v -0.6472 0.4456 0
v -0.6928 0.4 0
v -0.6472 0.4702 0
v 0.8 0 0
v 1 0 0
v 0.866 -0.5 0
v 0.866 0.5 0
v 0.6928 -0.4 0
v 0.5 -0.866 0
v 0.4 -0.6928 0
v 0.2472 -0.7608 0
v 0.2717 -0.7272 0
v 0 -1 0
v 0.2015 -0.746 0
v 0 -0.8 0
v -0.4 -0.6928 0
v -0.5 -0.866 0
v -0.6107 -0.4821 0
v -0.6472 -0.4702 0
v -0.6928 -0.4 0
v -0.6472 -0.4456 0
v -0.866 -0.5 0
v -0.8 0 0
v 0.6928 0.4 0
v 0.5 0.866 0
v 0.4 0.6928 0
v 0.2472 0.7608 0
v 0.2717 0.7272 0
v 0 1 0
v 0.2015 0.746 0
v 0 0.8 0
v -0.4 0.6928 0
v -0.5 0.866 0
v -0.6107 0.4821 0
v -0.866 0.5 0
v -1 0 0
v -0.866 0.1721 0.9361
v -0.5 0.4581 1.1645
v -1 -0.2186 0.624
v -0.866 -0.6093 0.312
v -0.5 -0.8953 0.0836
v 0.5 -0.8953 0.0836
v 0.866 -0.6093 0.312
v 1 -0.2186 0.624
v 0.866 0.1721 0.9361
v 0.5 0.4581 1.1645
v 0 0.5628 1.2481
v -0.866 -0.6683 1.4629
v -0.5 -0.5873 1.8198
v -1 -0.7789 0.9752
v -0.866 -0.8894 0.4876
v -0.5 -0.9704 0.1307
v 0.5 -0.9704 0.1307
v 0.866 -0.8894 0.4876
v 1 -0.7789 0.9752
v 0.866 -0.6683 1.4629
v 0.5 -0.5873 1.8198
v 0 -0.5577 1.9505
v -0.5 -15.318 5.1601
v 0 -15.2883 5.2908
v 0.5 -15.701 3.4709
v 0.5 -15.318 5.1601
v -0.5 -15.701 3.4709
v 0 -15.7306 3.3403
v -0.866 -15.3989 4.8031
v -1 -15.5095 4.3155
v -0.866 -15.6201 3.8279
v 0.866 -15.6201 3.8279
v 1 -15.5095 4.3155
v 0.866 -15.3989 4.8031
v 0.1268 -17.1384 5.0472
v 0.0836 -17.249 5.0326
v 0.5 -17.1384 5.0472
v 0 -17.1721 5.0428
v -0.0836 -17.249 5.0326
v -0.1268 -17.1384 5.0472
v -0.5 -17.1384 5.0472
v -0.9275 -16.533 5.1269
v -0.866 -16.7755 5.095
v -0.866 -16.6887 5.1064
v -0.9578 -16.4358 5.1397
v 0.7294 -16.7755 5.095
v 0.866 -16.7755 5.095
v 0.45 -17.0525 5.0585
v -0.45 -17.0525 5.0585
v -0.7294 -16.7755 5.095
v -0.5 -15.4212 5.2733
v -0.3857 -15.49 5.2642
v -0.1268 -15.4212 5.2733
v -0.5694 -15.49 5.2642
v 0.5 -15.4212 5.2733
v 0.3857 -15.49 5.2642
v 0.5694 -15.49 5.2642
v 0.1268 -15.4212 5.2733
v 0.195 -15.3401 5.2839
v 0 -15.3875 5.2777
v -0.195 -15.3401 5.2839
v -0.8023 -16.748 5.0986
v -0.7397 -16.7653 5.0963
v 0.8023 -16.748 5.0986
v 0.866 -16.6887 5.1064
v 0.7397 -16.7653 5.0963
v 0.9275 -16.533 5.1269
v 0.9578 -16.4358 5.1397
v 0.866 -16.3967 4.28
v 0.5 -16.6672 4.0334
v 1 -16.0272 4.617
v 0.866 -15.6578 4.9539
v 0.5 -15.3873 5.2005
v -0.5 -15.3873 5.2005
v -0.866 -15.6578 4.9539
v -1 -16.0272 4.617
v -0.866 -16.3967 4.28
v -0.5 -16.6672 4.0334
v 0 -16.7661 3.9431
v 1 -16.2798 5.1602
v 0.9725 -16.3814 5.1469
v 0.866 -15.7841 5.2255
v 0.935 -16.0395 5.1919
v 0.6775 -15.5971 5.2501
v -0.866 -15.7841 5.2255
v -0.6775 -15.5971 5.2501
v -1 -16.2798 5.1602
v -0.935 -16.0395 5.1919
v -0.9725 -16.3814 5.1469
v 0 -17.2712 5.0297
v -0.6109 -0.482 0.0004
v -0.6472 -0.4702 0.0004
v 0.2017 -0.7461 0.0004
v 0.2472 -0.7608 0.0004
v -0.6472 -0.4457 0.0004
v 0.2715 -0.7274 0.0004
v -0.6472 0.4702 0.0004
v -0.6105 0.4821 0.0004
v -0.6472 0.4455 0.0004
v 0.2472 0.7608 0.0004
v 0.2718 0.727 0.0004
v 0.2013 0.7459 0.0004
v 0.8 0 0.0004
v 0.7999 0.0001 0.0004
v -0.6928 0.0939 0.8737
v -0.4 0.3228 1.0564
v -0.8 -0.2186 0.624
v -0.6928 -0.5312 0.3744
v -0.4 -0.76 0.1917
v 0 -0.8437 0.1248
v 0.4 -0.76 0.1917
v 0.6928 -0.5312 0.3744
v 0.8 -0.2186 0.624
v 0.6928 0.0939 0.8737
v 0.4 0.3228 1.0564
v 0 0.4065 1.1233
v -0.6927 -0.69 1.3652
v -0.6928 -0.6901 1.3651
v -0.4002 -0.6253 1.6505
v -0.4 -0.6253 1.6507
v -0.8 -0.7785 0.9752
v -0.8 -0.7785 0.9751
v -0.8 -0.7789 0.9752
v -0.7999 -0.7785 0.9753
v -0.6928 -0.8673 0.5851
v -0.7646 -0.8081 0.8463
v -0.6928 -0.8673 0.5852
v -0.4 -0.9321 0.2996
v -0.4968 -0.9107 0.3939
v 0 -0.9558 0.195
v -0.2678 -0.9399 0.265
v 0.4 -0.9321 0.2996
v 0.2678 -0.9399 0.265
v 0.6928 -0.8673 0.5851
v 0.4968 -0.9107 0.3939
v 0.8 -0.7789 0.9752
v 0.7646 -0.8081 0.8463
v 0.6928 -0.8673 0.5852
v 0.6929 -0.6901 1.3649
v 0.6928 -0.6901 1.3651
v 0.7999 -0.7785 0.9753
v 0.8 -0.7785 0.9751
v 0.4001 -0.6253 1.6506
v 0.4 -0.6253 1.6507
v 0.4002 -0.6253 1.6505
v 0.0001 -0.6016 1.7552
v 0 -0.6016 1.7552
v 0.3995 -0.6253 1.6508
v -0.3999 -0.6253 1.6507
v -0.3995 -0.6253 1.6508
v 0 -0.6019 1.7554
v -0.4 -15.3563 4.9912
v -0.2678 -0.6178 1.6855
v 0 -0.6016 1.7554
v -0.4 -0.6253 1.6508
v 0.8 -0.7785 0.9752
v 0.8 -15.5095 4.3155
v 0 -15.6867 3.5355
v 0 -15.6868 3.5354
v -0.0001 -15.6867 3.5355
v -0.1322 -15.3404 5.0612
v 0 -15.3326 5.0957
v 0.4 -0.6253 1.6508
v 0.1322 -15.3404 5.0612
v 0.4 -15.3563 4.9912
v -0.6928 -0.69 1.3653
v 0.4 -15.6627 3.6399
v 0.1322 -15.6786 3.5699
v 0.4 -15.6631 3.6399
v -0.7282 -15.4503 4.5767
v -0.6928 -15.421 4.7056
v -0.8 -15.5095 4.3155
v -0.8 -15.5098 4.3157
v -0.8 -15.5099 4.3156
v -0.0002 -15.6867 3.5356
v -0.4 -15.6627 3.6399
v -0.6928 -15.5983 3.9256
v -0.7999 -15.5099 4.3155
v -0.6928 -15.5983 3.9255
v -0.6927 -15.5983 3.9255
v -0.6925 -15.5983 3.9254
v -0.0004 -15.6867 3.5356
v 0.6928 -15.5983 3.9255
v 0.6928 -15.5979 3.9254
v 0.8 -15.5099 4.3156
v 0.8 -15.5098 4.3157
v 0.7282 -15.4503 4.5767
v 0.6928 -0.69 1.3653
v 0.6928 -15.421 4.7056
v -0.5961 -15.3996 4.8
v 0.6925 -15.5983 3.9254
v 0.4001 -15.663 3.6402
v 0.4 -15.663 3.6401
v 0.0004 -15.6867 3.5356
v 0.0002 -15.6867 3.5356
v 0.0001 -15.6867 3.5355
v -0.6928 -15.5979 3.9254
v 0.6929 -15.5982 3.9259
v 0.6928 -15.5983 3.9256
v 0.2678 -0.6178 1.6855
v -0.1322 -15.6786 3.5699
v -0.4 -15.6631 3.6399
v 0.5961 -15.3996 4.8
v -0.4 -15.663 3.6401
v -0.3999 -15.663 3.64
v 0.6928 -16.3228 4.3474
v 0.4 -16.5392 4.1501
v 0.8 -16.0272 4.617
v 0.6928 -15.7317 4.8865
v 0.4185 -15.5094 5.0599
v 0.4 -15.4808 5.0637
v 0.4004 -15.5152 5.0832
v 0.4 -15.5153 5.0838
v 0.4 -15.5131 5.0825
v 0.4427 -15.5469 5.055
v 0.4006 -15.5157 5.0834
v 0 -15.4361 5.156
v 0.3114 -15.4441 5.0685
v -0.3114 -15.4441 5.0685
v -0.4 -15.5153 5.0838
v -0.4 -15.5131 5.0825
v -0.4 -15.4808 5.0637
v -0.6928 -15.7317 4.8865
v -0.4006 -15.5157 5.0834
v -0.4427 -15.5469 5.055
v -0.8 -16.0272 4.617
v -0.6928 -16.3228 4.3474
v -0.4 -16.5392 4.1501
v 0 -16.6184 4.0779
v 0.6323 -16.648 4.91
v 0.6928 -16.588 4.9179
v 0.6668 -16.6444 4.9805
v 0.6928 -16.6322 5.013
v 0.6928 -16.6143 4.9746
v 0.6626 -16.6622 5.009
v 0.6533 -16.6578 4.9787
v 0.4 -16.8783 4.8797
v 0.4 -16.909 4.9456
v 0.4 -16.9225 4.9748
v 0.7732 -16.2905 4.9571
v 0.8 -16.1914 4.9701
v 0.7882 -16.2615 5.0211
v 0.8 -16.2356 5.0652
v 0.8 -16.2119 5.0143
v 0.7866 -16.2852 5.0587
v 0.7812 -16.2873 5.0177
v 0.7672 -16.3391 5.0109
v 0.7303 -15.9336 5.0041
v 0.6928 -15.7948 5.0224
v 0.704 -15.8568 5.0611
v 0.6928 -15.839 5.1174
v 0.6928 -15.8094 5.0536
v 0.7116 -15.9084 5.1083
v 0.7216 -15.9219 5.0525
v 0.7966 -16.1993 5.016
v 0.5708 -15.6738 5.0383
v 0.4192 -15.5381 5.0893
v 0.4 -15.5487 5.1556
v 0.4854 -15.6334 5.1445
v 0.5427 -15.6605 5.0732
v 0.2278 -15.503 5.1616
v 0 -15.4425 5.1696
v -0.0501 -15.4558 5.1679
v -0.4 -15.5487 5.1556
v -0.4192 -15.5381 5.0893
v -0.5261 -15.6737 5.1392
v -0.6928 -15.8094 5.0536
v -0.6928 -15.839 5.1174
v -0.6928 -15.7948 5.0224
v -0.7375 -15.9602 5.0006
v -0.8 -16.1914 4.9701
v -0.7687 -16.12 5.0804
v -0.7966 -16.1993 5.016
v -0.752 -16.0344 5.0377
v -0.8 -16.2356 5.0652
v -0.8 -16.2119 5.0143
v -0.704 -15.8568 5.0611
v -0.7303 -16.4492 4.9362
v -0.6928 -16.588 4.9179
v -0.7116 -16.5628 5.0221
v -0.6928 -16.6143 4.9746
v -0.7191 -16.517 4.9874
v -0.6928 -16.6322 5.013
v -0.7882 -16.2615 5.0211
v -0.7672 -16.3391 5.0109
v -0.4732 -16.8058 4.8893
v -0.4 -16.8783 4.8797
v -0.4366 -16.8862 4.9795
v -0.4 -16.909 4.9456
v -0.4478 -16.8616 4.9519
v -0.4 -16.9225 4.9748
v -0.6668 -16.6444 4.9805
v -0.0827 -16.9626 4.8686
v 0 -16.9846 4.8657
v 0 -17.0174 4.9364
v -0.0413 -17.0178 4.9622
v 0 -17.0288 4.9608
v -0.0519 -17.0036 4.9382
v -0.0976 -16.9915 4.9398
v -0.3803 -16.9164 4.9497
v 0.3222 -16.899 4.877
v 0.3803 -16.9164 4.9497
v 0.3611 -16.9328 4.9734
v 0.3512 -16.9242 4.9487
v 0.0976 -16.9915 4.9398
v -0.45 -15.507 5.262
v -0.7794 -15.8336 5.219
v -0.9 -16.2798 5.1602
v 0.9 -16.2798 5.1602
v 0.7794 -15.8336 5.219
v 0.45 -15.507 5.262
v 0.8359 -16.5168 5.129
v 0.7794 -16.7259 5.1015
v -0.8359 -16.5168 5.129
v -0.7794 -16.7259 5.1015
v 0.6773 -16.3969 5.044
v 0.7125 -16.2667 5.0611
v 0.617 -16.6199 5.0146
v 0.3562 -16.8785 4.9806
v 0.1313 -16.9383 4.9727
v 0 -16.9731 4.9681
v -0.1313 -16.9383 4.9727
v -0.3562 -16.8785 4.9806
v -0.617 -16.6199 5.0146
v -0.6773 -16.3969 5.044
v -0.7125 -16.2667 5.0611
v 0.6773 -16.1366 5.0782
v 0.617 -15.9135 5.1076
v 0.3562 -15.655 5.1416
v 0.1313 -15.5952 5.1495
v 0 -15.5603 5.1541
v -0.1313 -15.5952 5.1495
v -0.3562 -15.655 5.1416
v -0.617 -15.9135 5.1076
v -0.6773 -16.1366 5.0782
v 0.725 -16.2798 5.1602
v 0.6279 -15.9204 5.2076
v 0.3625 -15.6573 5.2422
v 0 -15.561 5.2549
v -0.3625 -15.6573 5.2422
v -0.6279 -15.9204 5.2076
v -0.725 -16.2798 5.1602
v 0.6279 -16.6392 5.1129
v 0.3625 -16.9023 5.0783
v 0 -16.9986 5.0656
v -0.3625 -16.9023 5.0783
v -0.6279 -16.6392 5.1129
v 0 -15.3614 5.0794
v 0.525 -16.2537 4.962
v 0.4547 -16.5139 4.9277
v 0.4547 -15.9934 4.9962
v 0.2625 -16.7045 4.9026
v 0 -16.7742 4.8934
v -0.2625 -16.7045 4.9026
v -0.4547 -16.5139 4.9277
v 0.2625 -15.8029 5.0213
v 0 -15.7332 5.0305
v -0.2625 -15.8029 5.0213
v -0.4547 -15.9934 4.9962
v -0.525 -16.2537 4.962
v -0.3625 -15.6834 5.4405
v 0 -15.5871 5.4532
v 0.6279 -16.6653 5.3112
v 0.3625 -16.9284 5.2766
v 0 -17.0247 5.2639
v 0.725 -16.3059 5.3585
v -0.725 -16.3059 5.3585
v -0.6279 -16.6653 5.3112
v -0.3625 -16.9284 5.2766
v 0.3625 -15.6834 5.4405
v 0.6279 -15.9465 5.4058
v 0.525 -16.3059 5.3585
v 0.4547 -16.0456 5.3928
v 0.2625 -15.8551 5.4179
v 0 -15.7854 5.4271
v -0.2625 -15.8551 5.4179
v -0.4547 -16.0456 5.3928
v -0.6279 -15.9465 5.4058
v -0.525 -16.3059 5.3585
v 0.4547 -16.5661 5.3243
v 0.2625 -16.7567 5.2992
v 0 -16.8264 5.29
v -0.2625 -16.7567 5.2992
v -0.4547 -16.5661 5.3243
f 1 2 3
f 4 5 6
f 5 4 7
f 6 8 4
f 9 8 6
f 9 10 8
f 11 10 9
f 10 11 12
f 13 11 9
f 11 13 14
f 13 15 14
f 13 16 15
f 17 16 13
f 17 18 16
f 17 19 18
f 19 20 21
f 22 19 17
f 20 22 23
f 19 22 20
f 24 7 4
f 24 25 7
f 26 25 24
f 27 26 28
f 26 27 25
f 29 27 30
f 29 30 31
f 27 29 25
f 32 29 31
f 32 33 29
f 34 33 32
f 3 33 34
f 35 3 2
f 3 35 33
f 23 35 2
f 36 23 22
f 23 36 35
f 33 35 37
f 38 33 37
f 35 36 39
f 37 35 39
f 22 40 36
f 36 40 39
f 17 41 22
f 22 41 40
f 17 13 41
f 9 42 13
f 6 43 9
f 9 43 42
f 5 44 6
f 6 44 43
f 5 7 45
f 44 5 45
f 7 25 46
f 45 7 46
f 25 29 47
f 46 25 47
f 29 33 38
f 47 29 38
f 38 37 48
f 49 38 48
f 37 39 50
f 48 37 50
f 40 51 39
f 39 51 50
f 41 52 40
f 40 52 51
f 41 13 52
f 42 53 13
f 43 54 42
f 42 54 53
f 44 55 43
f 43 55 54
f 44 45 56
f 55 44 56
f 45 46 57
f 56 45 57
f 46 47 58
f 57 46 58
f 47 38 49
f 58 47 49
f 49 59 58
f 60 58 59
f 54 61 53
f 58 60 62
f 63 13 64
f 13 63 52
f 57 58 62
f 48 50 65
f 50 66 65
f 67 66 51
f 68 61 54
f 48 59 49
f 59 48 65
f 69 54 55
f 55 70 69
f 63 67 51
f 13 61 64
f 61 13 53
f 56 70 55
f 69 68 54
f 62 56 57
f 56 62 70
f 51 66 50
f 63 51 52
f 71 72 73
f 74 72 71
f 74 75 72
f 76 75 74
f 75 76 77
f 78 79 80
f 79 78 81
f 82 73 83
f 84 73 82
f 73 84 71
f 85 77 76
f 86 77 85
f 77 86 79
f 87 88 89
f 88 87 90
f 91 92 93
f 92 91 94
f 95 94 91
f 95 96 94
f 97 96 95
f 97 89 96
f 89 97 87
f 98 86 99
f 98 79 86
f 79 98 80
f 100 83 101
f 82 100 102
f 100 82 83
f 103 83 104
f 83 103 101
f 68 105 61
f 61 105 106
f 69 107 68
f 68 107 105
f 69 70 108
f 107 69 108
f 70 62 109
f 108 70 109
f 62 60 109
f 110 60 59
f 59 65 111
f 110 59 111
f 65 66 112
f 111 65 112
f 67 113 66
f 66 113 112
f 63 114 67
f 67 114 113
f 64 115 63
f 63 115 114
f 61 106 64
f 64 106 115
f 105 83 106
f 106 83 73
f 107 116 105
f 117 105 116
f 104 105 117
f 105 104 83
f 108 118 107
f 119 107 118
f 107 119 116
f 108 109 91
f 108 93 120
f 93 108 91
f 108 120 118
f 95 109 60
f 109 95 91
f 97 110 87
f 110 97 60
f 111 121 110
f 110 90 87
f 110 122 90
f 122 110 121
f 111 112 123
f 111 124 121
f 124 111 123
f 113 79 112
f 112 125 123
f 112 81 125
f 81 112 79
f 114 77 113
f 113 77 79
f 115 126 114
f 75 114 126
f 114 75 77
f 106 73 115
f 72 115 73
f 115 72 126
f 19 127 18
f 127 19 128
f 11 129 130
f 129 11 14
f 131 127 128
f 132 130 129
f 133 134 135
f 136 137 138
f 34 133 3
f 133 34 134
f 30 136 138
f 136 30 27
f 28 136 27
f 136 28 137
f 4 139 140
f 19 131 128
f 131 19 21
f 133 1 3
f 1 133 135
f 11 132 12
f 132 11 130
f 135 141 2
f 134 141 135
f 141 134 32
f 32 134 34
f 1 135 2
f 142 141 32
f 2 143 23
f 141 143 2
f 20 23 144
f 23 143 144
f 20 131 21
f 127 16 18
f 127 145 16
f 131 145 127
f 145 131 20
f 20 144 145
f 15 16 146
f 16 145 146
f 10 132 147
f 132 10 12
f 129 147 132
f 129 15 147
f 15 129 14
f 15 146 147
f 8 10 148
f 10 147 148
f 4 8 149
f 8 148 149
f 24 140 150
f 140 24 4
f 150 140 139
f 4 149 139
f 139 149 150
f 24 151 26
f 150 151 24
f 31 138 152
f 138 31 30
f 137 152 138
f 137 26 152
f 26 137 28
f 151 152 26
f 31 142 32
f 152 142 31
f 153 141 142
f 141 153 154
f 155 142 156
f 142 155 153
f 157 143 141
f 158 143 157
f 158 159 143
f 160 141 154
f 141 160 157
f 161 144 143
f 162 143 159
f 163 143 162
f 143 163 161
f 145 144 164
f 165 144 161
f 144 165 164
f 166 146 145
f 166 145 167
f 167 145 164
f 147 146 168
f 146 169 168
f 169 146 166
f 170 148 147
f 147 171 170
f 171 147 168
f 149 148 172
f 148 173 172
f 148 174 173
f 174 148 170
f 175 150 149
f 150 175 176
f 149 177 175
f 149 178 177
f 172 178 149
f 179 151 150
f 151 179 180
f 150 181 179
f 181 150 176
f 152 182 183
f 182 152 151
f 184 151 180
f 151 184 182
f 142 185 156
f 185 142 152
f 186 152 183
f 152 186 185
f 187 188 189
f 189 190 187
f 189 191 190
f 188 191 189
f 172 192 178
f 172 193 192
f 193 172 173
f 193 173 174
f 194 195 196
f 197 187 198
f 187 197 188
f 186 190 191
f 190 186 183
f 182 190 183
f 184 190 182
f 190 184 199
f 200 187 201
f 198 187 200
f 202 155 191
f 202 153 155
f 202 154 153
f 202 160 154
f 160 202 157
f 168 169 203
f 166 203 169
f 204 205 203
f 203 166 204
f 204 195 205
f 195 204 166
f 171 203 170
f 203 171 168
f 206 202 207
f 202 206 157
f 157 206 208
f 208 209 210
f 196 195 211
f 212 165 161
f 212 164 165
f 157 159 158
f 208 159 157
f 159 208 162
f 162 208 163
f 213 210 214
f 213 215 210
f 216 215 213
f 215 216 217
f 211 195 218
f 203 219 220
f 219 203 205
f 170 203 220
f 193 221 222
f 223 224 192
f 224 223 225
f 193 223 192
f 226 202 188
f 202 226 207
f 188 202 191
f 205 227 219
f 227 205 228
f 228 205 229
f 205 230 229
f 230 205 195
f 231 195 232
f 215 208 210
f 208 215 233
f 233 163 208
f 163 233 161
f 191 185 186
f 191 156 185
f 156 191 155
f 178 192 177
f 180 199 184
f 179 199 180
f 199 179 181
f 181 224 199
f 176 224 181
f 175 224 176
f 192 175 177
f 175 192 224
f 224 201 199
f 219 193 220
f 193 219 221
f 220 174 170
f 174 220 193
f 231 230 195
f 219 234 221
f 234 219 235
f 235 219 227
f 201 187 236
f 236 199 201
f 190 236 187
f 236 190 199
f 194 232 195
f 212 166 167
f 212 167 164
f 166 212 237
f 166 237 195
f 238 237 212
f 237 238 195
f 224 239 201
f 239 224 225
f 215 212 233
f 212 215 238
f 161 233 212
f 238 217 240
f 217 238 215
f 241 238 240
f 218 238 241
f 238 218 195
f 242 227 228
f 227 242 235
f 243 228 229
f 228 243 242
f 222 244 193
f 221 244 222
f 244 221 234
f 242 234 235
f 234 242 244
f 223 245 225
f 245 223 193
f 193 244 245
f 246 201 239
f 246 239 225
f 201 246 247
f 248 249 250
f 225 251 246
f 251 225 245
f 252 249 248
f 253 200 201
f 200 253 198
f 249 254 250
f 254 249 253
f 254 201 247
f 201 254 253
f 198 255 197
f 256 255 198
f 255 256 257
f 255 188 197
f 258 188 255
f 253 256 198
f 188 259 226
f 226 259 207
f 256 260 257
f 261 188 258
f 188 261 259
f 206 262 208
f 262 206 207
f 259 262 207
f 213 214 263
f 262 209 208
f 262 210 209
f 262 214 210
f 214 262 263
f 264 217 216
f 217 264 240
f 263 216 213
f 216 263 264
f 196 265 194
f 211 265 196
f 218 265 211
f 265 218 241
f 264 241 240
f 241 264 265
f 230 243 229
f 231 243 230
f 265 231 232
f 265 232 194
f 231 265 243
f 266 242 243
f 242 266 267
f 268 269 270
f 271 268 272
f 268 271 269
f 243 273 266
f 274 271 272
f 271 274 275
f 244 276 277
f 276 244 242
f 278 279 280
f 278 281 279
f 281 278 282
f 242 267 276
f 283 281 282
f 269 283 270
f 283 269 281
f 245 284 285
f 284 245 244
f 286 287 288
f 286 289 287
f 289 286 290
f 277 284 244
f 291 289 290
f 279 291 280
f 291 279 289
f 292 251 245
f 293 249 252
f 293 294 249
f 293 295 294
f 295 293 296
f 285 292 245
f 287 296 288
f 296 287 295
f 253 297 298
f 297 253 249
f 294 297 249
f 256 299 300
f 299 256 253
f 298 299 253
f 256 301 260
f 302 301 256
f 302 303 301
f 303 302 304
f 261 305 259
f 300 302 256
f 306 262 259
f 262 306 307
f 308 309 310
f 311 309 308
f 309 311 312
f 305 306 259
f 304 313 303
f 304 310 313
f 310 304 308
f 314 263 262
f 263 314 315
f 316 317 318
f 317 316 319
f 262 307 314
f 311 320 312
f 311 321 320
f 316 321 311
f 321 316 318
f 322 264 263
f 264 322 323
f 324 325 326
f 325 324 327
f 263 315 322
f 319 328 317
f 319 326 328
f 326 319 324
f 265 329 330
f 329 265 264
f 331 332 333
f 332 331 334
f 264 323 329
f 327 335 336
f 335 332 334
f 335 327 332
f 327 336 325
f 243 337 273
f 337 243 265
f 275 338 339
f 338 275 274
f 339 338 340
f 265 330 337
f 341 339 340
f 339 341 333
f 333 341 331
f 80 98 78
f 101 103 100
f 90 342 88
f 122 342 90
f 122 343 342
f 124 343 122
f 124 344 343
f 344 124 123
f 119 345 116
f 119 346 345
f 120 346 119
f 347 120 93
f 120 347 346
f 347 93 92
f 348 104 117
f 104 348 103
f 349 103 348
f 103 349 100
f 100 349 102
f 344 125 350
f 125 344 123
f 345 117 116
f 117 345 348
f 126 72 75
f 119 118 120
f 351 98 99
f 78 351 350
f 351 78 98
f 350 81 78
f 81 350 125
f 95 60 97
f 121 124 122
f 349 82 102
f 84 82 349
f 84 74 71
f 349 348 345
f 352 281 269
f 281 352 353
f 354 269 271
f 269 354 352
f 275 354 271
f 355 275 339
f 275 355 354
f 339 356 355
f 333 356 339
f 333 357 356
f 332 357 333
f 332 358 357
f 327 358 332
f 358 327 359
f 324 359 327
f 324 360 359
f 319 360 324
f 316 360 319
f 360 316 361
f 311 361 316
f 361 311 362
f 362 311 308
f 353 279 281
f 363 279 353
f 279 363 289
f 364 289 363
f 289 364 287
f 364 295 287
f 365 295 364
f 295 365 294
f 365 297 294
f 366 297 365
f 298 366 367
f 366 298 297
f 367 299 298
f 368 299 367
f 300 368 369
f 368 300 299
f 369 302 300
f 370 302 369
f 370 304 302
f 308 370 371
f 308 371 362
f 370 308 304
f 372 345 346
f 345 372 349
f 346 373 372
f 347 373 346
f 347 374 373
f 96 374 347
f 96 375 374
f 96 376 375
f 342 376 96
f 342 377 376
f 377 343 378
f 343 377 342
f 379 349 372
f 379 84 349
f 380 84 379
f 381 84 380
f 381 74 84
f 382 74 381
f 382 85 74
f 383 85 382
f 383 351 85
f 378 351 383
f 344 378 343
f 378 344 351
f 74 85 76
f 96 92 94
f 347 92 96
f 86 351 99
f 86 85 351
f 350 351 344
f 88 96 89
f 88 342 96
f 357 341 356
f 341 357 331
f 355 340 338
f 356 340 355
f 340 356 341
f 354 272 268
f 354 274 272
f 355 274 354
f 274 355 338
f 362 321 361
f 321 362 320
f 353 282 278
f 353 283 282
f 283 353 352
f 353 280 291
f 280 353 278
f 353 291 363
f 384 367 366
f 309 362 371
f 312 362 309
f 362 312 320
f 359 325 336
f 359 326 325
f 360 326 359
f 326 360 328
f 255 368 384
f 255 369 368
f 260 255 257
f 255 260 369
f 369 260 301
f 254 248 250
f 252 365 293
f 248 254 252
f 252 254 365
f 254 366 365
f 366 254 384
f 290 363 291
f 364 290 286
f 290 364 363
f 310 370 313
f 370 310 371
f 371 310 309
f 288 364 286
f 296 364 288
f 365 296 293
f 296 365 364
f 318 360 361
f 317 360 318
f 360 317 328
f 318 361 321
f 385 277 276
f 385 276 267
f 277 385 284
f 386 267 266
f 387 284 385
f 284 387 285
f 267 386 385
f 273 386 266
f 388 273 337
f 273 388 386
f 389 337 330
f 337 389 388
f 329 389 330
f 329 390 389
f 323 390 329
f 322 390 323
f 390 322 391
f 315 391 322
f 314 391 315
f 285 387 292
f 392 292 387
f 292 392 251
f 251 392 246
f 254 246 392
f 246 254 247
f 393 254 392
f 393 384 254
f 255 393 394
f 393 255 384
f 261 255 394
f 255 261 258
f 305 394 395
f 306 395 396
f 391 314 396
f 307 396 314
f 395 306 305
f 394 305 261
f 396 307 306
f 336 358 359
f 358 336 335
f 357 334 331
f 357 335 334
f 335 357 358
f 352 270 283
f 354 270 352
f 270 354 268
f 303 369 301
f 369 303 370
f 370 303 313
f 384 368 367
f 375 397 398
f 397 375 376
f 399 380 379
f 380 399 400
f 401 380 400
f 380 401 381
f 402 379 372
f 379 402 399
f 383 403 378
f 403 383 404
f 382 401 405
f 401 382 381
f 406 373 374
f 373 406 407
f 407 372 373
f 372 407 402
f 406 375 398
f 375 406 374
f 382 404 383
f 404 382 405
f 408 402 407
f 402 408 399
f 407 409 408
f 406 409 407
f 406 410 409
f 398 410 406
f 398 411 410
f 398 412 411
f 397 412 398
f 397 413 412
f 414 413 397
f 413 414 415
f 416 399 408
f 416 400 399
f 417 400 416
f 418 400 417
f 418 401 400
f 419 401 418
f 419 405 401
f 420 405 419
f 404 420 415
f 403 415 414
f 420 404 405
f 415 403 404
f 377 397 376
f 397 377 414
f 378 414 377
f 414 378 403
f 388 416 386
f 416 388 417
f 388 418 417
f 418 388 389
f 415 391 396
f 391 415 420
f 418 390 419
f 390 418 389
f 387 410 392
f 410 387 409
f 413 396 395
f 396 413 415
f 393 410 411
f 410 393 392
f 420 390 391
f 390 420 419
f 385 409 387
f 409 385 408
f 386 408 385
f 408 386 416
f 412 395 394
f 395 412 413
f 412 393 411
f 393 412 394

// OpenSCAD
tolerance=0.075;
hole_radius=0.05;
grid_hole_radius=0.05;
outer_radius=1;
thickness=0.2;
hole_attach_height=0.05;
attach_thickness=0.1;

//parameters that don't have to be defined explicitly
eps = tolerance/100;
inner_radius = outer_radius - thickness;
fn = 12;
fnh = 6;

module angled_cylinder(angle_deg_y, _h, _r, angle_deg_x = 0) {
    rotate([angle_deg_x, angle_deg_y, 0]) { // Rotate the cylinder 
            cylinder(h = _h, r = _r, center = true, $fn = fnh);
        }
}

module hole(_h) {
    cylinder(h = _h, r = grid_hole_radius, $fn = fnh);
}

//makes circle of holes
module circular_grid(_h, _r, _n) {
    for (i = [0:_n-1]) {
        angle = i * 360 / _n;
        x_pos = _r * cos(angle);
        y_pos = _r * sin(angle);
        translate([x_pos, y_pos, -eps]) {
            hole(_h);
        }
    }
}

//makes grid of holes
module hole_grid(hole_height, grid_h) {
    translate([0,0,hole_height]) {
        difference() {
            //cylinder
            cylinder(h = grid_h, r = (inner_radius + outer_radius)/2, 
                center=false, $fn = fn);
            //holes
            for (i = [0 : grid_hole_radius * 2 + hole_attach_height : inner_radius - grid_hole_radius * 2]) {
                circular_grid(grid_h + eps*2, i, ceil(6.28*i/(grid_hole_radius*4)));
            }
            
        } 
    }
}

//makes curve of CSC
module curve(_radius, _twist, _turning_angle, _turning_radius) {
    rotate([90,0,_twist])
    translate([-_turning_radius, 0, 0])
    rotate_extrude(angle=_turning_angle, convexity=100, $fn = fn)
    translate([_turning_radius, 0]) circle(_radius);
}

module CSC(_r, _t1, _ta1, _tr1, _h, _t2, _ta2, _tr2, is_inner) {
    
    if (_ta1 > 90) {
        CSC(_r, _t1, 90, _tr1, 0, 0, 0, 0, is_inner);
        
        pos1 = (-_tr1 + sqrt(_tr1*_tr1 - pow(_tr1,2)));
        translate([pos1*cos(_t1),pos1*sin(_t1),_tr1])
        rotate([0,-90,_t1])
        CSC(_r, 0, _ta1 - 90, _tr1, _h, _t2, _ta2, _tr2, is_inner);
    } else if (_ta2 > 90) {
        CSC(_r, _t1, _ta1, _tr1, _h, _t2, 90, _tr2, is_inner);
        
        pos1 = (-_tr1 + sqrt(_tr1*_tr1 - pow(_tr1*sin(_ta1),2)));
        pos2 = (-_tr2 + sqrt(_tr2*_tr2 - pow(_tr2,2)));
        translate([pos1*cos(_t1),pos1*sin(_t1),_tr1*sin(_ta1)])
        rotate([0,-_ta1,_t1])
        translate([0, 0, _h])
        translate([pos2*cos(_t2),pos2*sin(_t2),_tr2])
        rotate([0,-90,_t2])
        CSC(_r, 0, 0, 0, 0, 0, _ta2 - 90, _tr2, is_inner);
    } else {
        //intermediate positions
        pos1 = (-_tr1 + sqrt(_tr1*_tr1 - pow(_tr1*sin(_ta1),2)));
        pos2 = (-_tr2 + sqrt(_tr2*_tr2 - pow(_tr2*sin(_ta2),2)));
        
        union() {
            //bottom shell threshold
            if (is_inner) {
                cylinder(h=eps, r=_r, center=true);
            }
            
            //first curve of CSC
            curve(_r, _t1, _ta1, _tr1);
            
            //straight link of CSC
            translate([pos1*cos(_t1),pos1*sin(_t1),_tr1*sin(_ta1)])
            rotate([0,-_ta1,_t1])
            if (is_inner) {
                //add threshold for shelling
                translate([0,0,-eps /2])
                cylinder(h=_h + eps,r=_r, center = false, $fn= fn);
            } else {
                cylinder(h=_h,r=_r, center = false, $fn= fn);
            }
            
            //second curve of CSC
            translate([pos1*cos(_t1),pos1*sin(_t1),_tr1*sin(_ta1)])
            rotate([0,-_ta1,_t1])
            translate([0, 0, _h])
            curve(_r, _t2, _ta2, _tr2);
            
            //shelling thresholds
            if (is_inner) {
                translate([pos1*cos(_t1),pos1*sin(_t1),_tr1*sin(_ta1)])
                rotate([0,-_ta1,_t1])
                translate([0, 0, _h])
                translate([pos2*cos(_t2),pos2*sin(_t2),_tr2*sin(_ta2)])
                rotate([0,-_ta2,_t2]) {
                    cylinder(h=eps, r=_r, center=true,$fn=fn);
                }
            
            }
        }
    }
    
}

//allow modules to attach
module CSC_ATTACH(_r, _t1, _ta1, _tr1, _h, _t2, _ta2, _tr2, next_hole_radius, next_hole_attach_height, next_inner) {
    
    if (_ta1 > 90) {        
        pos1 = (-_tr1 + sqrt(_tr1*_tr1 - pow(_tr1,2)));
        translate([pos1*cos(_t1),pos1*sin(_t1),_tr1])
        rotate([0,-90,_t1])
        CSC_ATTACH(_r, 0, _ta1 - 90, _tr1, _h, _t2, _ta2, _tr2, next_hole_radius, next_hole_attach_height, next_inner);
    } else if (_ta2 > 90) {        
        pos1 = (-_tr1 + sqrt(_tr1*_tr1 - pow(_tr1*sin(_ta1),2)));
        pos2 = (-_tr2 + sqrt(_tr2*_tr2 - pow(_tr2,2)));
        translate([pos1*cos(_t1),pos1*sin(_t1),_tr1*sin(_ta1)])
        rotate([0,-_ta1,_t1])
        translate([0, 0, _h])
        translate([pos2*cos(_t2),pos2*sin(_t2),_tr2])
        rotate([0,-90,_t2])
        CSC_ATTACH(_r, 0, 0, 0, 0, 0, _ta2 - 90, _tr2, next_hole_radius, next_hole_attach_height, next_inner);
    } else {
        //intermediate positions
        pos1 = (-_tr1 + sqrt(_tr1*_tr1 - pow(_tr1*sin(_ta1),2)));
        pos2 = (-_tr2 + sqrt(_tr2*_tr2 - pow(_tr2*sin(_ta2),2)));
        
        translate([pos1*cos(_t1),pos1*sin(_t1),_tr1*sin(_ta1)])
        rotate([0,-_ta1,_t1])
        translate([0, 0, _h])
        translate([pos2*cos(_t2),pos2*sin(_t2),_tr2*sin(_ta2)])
        rotate([0,-_ta2,_t2]) {
            difference() {
                union() {
                    //attachment for smaller cylinder
                    translate([0,0,-attach_thickness])
                    cylinder(h=attach_thickness, r=_r - thickness/2, $fn=fn);
                    translate([0,0,-attach_thickness*2])
                    cylinder(h=attach_thickness*2, r1=_r - thickness/2, r2=next_inner - tolerance - thickness, $fn=fn);
                    
                    //small cylinder
                    cylinder(h=next_hole_radius*2 + next_hole_attach_height * 2, r = next_inner - tolerance, $fn=fn);
                }
                
                //shelling
                translate([0,0, -attach_thickness*2 - eps/2])
                cylinder(h=next_hole_radius*2 + next_hole_attach_height * 2 + attach_thickness*2 + eps, r = min(inner_radius, next_inner - tolerance - thickness), $fn=fn);
                
                //holes for screws
    //            translate([0,0,next_hole_attach_height + next_hole_radius]) {
    //                angled_cylinder(0, (next_inner + thickness + eps) * 2,  hole_radius, 90);
    //                angled_cylinder(90, (next_inner + thickness + eps) * 2, hole_radius, 0);
    //            }
            }
        }
    }
}

//remove overlap to allow all branches to attach to each other
module CSC_REMOVE_OVERLAP(_r, _t1, _ta1, _tr1, _h, _t2, _ta2, _tr2, next_hole_radius, next_hole_attach_height, next_inner) {
    if (_ta1 > 90) {        
        pos1 = (-_tr1 + sqrt(_tr1*_tr1 - pow(_tr1,2)));
        translate([pos1*cos(_t1),pos1*sin(_t1),_tr1])
        rotate([0,-90,_t1])
        CSC_REMOVE_OVERLAP(_r, 0, _ta1 - 90, _tr1, _h, _t2, _ta2, _tr2, next_hole_radius, next_hole_attach_height, next_inner);
    } else if (_ta2 > 90) {        
        pos1 = (-_tr1 + sqrt(_tr1*_tr1 - pow(_tr1*sin(_ta1),2)));
        pos2 = (-_tr2 + sqrt(_tr2*_tr2 - pow(_tr2,2)));
        translate([pos1*cos(_t1),pos1*sin(_t1),_tr1*sin(_ta1)])
        rotate([0,-_ta1,_t1])
        translate([0, 0, _h])
        translate([pos2*cos(_t2),pos2*sin(_t2),_tr2])
        rotate([0,-90,_t2])
        CSC_REMOVE_OVERLAP(_r, 0, 0, 0, 0, 0, _ta2 - 90, _tr2, next_hole_radius, next_hole_attach_height, next_inner);
    } else {
        pos1 = (-_tr1 + sqrt(_tr1*_tr1 - pow(_tr1*sin(_ta1),2)));
        pos2 = (-_tr2 + sqrt(_tr2*_tr2 - pow(_tr2*sin(_ta2),2)));
        
        translate([pos1*cos(_t1),pos1*sin(_t1),_tr1*sin(_ta1)])
        rotate([0,-_ta1,_t1])
        translate([0, 0, _h])
        translate([pos2*cos(_t2),pos2*sin(_t2),_tr2*sin(_ta2)])
        rotate([0,-_ta2,_t2]) {
            cylinder(h=999999, r=_r + tolerance, $fn=fn);
        }
    }
}

//c is _t1, _ta1, _tr1, _h, _t2, _ta2, _tr2, next hole radius, next hole height, next inner radius
module branch(branch_list, _outer, _inner) {
    union() {
        //make grid of holes
        //hole_grid(hole_radius*2 + hole_attach_height * 2, grid_hole_radius);
        
        //make CSC shells for each CSC in branch_list
        difference() {
            for (c = branch_list) {
                CSC(_outer,c[0],c[1],c[2],c[3],c[4],c[5],c[6], false);
            }
            
            for (c = branch_list) {
                CSC(_inner,c[0],c[1],c[2],c[3],c[4],c[5],c[6], true);
                CSC_REMOVE_OVERLAP(_outer,c[0],c[1],c[2],c[3],c[4],c[5],c[6],c[7], c[8], c[9]);
            }
            
            //make screw holes at the bottom
//            translate([0,0,hole_radius + hole_attach_height]) {
//                angled_cylinder(0, (outer_radius*1.5 + eps) * 2,  hole_radius, 90);
//                angled_cylinder(90, (outer_radius*1.5 + eps) * 2, hole_radius, 0);
//            }    
        }
        for (c=branch_list) {     
            CSC_ATTACH(_outer,c[0],c[1],c[2],c[3],c[4],c[5],c[6], c[7], c[8], c[9]);
        }
    }
}

branch([
[ 90.0, 77.2238, 1.0*outer_radius, 15.1046*outer_radius, 180.0, 69.7238, 1.0*outer_radius, 0.05, 0.05, 0.8],
],outer_radius,inner_radius);
